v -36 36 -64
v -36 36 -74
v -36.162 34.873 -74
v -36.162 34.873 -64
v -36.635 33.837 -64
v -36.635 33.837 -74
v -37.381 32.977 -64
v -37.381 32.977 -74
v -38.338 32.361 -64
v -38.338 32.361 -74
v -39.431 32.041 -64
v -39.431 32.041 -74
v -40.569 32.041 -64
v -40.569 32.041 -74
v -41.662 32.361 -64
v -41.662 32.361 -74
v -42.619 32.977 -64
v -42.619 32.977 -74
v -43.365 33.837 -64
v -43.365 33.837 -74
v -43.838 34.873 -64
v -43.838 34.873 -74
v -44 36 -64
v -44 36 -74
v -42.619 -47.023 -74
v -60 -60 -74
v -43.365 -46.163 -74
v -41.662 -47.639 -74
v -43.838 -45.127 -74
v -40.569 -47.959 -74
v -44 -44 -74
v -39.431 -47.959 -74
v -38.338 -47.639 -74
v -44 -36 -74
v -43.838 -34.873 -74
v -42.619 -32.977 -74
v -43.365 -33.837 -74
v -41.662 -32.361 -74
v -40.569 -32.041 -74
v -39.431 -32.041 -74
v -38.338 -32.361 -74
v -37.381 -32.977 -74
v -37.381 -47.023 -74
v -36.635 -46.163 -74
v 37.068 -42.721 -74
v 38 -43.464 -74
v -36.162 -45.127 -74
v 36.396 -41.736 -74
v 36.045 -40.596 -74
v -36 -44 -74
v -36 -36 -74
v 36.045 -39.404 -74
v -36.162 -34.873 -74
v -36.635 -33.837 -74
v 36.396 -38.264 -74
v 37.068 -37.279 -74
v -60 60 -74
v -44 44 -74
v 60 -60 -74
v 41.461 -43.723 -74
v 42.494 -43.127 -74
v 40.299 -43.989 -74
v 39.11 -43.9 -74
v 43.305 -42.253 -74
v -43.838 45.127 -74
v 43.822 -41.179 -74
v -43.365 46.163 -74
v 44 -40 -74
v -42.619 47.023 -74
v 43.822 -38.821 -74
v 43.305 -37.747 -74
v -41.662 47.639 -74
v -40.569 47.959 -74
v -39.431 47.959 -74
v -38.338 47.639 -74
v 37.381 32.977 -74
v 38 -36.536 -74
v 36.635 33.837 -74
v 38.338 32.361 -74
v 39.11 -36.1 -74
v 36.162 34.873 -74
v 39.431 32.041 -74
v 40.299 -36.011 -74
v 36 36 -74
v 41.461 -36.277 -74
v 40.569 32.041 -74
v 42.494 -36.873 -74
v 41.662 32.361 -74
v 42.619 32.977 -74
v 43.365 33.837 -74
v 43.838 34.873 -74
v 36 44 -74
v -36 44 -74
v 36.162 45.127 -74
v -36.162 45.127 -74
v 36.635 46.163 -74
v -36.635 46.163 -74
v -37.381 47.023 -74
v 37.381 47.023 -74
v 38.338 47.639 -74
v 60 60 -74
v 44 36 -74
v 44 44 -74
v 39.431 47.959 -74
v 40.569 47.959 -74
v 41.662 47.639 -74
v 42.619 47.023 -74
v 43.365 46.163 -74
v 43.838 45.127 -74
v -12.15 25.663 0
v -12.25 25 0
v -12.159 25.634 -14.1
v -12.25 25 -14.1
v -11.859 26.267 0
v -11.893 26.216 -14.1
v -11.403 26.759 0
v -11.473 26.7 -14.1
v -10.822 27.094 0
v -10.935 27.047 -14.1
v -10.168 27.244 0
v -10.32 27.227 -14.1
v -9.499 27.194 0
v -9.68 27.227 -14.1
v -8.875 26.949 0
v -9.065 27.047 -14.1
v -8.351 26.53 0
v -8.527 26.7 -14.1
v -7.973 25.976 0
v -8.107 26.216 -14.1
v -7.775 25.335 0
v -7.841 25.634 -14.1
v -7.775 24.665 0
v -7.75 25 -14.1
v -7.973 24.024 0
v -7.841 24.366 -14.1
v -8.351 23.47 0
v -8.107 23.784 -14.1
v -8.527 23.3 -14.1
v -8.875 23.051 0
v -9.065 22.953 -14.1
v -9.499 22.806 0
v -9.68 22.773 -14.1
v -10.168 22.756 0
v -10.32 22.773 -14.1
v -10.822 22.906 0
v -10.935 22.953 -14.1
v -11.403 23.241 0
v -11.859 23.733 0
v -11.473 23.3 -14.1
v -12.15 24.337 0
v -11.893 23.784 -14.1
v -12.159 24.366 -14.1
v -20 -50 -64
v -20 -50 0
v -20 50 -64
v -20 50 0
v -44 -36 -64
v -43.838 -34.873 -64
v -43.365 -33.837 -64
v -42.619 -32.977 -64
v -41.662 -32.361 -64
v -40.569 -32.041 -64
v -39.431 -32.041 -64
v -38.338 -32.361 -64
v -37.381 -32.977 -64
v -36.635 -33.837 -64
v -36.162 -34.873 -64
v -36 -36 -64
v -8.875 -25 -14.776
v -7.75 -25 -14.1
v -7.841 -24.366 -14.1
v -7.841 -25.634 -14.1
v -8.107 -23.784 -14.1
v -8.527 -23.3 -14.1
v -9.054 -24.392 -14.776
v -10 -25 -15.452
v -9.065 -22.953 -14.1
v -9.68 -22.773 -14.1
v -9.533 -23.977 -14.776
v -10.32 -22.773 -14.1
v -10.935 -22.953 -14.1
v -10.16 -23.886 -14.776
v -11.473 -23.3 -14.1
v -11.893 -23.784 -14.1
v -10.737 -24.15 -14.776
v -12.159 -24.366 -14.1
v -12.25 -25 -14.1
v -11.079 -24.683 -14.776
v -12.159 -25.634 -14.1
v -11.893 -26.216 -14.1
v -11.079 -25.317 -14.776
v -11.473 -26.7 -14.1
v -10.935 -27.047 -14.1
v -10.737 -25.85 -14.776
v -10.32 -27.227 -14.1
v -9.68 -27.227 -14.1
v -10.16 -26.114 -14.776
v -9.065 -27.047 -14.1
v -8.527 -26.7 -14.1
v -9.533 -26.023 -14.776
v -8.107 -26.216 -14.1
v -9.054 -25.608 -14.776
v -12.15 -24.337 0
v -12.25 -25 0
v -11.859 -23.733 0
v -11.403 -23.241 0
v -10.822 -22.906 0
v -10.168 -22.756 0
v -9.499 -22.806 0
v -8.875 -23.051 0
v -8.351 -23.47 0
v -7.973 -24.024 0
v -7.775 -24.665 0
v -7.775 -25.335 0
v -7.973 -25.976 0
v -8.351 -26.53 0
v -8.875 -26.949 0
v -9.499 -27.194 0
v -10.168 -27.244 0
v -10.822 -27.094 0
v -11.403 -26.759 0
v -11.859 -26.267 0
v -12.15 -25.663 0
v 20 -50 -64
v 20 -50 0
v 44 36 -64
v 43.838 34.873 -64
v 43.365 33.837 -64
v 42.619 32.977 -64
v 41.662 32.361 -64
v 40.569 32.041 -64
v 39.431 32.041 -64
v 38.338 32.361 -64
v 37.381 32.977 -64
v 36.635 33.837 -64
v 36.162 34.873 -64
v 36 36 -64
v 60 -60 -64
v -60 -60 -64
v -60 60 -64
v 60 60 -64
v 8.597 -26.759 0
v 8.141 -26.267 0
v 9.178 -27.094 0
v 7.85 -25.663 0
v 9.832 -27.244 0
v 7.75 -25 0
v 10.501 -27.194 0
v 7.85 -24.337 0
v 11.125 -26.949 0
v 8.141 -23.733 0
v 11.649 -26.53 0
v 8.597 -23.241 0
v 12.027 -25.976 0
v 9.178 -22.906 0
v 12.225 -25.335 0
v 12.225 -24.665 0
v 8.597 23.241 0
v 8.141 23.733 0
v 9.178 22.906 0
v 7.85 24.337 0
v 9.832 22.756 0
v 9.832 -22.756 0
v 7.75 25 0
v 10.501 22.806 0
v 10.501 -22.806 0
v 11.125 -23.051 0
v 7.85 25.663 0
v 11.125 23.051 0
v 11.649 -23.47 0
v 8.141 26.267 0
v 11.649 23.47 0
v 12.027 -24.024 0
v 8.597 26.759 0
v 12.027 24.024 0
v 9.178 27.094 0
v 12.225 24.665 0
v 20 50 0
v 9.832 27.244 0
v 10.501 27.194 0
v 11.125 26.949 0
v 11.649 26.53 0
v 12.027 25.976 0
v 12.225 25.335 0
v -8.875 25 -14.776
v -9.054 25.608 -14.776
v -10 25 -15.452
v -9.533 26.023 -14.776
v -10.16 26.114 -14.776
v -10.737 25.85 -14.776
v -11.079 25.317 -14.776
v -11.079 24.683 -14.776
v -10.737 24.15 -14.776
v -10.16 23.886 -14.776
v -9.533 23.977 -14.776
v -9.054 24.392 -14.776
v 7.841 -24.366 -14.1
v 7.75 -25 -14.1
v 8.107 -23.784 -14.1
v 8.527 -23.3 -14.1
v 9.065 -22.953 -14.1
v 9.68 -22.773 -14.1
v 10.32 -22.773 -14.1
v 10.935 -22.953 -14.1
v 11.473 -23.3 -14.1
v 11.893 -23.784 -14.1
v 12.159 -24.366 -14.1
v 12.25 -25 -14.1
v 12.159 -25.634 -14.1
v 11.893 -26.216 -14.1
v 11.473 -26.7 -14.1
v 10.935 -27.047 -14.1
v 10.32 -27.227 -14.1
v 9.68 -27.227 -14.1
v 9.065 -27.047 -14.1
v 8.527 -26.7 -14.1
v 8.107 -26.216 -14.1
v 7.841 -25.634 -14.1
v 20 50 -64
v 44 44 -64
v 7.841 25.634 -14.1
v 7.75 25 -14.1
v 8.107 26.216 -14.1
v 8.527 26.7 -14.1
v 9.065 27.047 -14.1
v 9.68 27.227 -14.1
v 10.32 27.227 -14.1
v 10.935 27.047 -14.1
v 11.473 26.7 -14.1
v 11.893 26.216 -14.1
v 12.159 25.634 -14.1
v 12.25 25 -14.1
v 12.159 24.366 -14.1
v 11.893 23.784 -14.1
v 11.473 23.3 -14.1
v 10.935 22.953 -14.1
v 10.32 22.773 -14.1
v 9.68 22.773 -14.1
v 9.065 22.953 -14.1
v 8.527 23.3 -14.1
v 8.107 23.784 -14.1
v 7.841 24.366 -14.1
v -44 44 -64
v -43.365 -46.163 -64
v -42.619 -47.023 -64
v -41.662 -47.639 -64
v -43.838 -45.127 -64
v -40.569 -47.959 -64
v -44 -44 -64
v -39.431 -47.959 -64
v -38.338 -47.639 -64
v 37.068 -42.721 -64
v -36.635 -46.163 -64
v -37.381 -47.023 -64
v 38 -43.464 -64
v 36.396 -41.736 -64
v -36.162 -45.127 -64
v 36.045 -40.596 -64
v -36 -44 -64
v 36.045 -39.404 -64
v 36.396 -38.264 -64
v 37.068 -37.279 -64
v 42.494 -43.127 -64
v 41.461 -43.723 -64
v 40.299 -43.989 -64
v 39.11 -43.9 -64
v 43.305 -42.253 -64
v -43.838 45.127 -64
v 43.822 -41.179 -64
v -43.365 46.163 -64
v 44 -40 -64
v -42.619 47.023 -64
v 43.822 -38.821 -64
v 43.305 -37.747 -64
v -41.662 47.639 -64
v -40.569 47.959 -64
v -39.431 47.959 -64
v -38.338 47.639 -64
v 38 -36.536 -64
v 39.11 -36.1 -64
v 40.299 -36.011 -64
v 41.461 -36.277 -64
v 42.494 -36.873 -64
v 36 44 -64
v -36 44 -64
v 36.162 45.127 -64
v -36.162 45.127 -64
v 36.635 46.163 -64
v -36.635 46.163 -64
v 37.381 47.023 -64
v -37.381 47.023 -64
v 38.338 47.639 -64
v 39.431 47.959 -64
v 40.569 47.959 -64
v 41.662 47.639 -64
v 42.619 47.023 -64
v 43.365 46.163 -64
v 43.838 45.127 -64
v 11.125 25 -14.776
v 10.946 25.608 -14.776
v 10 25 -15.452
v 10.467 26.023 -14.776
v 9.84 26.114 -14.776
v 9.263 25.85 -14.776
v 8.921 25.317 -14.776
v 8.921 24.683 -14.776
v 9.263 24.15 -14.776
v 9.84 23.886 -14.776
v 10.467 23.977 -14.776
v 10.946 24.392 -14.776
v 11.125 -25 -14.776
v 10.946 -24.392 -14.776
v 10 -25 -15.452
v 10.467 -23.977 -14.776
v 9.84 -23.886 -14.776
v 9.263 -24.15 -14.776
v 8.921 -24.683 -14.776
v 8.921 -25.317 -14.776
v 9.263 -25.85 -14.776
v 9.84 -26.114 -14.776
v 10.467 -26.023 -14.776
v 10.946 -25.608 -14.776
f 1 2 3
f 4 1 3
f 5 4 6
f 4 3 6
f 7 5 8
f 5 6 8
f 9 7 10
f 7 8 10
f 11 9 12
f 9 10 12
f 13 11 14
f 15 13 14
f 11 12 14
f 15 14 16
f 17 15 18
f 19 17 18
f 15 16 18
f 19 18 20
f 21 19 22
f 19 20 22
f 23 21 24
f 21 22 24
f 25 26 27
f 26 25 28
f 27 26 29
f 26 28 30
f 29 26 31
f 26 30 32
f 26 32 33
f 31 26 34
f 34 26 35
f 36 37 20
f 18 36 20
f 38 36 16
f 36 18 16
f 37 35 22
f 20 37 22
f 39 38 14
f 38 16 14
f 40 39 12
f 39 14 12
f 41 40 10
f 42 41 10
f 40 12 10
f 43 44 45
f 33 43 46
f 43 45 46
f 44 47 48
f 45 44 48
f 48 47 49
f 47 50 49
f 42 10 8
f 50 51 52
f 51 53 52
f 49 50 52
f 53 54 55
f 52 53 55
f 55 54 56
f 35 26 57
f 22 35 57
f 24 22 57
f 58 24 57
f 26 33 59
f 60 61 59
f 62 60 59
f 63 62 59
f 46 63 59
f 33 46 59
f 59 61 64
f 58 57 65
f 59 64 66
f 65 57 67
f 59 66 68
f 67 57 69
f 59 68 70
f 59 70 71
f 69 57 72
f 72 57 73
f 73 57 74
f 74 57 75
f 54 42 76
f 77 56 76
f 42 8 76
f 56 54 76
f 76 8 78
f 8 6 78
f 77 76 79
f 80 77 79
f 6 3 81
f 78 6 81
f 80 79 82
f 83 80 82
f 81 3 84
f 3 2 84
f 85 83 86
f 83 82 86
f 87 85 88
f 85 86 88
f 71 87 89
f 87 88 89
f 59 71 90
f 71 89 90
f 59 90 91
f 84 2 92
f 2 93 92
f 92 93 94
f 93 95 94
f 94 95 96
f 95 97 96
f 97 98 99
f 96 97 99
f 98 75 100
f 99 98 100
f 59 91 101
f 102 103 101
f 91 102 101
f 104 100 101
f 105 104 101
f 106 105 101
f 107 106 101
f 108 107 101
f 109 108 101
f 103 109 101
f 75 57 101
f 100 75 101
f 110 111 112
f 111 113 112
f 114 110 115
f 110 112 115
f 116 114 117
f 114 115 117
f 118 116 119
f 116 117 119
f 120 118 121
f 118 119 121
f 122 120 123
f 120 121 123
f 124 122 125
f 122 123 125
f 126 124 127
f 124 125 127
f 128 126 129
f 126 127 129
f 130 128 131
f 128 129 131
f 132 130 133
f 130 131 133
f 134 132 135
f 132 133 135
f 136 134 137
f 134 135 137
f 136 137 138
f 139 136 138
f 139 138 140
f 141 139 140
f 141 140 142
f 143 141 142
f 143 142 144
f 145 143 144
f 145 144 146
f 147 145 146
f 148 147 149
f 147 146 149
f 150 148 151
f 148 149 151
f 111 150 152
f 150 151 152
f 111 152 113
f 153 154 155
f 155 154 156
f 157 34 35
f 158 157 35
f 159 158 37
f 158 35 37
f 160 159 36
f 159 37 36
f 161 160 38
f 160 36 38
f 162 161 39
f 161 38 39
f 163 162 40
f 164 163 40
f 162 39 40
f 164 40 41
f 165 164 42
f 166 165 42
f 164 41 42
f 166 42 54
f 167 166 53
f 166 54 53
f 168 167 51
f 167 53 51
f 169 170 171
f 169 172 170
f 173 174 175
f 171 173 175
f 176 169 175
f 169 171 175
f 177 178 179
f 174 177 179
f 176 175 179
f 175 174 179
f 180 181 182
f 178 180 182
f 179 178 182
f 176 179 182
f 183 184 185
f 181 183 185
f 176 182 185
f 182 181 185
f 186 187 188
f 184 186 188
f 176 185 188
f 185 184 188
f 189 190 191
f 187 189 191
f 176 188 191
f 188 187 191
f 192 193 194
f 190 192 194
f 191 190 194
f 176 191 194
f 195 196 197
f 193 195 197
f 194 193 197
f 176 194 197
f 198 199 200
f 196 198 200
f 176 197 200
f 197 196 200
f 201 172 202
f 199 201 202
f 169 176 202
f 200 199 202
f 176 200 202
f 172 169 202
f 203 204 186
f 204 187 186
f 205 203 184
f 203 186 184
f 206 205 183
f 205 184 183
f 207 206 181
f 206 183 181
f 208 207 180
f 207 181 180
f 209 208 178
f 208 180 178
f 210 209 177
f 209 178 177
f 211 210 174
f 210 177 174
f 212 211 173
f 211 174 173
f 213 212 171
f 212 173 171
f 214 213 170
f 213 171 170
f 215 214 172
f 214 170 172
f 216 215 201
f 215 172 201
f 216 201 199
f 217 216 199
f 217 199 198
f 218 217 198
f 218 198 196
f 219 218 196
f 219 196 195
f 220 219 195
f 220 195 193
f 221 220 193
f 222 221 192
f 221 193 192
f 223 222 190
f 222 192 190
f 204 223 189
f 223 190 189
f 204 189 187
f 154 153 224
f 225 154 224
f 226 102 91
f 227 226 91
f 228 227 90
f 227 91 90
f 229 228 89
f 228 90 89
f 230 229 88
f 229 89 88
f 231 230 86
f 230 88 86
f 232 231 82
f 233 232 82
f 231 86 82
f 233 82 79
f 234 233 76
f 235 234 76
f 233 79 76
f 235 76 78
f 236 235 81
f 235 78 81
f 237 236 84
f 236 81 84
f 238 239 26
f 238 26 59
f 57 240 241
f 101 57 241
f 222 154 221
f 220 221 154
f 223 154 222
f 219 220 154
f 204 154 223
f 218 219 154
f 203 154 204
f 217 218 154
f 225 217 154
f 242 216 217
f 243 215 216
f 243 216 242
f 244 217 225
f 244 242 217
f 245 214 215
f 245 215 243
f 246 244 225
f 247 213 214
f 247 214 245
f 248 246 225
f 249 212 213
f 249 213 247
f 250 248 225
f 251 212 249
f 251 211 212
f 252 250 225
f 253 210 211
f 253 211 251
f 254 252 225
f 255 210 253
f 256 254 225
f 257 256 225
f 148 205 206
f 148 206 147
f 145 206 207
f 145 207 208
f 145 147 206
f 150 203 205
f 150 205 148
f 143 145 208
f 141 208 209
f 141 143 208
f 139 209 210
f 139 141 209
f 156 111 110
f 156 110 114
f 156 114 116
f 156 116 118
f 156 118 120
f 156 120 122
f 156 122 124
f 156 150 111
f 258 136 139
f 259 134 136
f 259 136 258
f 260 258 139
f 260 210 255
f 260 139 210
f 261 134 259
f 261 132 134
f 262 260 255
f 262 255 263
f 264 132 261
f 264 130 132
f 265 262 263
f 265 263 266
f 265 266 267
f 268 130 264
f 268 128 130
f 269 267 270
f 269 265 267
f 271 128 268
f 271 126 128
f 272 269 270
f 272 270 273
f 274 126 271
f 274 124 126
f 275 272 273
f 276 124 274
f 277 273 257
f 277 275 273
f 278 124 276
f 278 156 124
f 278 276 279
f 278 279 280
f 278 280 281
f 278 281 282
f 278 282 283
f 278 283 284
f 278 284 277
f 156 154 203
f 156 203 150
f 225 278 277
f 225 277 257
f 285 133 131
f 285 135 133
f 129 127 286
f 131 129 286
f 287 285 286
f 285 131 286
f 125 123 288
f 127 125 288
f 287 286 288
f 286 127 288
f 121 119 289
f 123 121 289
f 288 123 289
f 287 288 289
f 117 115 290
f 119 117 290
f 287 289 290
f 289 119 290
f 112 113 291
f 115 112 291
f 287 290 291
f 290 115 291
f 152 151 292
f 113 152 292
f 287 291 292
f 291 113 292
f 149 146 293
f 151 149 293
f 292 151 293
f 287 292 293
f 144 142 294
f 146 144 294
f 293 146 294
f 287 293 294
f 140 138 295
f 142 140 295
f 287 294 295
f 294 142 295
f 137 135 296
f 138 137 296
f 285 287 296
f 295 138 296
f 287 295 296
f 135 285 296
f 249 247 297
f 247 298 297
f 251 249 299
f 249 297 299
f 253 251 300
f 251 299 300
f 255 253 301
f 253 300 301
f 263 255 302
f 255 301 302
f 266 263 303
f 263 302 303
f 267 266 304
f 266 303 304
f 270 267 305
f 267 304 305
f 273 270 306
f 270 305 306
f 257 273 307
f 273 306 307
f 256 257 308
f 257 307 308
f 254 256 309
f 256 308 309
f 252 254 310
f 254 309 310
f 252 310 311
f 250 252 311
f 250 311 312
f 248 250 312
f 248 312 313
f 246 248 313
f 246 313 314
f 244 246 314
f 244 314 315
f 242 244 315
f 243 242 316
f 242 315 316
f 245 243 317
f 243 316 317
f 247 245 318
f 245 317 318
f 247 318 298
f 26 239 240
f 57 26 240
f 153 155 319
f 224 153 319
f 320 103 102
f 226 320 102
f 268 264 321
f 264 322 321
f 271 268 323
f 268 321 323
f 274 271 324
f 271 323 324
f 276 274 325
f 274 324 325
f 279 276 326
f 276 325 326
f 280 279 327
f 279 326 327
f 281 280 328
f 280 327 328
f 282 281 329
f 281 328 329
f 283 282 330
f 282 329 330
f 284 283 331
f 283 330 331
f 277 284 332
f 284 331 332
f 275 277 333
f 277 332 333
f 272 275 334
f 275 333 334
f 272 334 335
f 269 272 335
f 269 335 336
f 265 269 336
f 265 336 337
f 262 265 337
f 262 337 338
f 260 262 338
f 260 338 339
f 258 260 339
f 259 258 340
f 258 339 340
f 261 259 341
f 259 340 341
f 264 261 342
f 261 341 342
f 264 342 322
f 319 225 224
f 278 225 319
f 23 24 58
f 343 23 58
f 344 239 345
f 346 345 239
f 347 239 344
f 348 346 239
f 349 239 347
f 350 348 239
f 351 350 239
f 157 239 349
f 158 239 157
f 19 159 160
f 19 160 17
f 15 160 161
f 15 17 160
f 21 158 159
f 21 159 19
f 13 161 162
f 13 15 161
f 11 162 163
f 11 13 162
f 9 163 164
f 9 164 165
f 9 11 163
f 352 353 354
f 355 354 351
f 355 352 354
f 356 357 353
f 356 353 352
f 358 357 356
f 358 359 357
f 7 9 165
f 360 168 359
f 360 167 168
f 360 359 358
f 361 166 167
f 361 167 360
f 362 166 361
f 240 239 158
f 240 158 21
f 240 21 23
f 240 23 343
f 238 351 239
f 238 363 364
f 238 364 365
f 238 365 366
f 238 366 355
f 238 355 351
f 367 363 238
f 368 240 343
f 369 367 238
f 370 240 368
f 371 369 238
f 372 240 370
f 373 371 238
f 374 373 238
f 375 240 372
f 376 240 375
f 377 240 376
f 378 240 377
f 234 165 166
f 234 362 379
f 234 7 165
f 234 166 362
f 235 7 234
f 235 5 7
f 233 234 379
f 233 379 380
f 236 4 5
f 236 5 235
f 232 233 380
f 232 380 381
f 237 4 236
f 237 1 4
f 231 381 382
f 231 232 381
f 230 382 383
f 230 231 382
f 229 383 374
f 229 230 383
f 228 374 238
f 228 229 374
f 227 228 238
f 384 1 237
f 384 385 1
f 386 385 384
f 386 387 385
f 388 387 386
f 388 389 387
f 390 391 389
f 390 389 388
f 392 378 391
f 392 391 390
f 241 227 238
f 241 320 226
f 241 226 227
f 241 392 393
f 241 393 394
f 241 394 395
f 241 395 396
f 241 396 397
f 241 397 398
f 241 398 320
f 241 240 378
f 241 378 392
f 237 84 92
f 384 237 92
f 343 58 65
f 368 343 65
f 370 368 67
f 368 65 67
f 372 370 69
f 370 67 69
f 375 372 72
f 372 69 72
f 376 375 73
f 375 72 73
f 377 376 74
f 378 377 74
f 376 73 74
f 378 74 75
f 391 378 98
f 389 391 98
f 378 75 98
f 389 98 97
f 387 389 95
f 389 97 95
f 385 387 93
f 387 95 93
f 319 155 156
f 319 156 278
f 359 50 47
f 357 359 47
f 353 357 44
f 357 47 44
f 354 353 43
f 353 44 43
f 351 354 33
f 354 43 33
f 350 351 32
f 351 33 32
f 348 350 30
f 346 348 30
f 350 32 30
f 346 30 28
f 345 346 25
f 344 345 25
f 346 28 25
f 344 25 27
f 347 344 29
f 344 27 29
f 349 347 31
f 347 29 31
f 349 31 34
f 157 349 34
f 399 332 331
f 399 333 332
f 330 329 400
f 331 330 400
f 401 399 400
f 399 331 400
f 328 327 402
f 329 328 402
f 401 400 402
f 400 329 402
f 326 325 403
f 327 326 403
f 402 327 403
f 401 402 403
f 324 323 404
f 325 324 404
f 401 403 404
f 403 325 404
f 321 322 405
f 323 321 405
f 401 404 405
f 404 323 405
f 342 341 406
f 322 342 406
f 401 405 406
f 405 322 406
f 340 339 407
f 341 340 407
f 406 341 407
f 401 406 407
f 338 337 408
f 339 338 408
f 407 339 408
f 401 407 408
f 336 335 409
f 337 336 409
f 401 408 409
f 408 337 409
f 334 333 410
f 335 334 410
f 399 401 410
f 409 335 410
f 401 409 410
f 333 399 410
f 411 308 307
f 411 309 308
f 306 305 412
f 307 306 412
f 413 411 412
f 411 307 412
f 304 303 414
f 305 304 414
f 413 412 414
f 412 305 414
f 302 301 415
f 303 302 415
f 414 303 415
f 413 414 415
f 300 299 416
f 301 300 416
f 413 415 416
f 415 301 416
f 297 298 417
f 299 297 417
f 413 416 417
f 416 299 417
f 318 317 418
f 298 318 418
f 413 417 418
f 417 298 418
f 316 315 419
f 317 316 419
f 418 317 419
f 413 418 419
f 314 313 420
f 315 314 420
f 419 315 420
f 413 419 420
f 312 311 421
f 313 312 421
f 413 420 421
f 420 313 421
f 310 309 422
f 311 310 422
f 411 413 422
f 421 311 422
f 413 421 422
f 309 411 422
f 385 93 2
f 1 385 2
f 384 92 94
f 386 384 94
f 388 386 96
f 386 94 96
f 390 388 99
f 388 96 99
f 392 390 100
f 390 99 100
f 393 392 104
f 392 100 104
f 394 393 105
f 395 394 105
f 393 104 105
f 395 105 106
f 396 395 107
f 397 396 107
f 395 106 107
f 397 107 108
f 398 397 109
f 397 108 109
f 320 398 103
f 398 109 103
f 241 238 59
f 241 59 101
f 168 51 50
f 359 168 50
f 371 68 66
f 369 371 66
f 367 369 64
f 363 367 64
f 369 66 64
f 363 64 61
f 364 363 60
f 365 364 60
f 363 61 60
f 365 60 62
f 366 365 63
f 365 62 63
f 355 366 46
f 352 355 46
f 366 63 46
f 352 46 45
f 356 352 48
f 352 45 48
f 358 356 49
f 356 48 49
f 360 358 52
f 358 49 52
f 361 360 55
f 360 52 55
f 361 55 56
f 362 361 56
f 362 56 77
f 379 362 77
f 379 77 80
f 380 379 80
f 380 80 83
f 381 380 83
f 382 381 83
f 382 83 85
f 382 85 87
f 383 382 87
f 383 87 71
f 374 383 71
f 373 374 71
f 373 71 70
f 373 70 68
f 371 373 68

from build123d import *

# Parameters (mm, degrees)
F0_W     = 40
F0_H     = 100
F1_DEPTH = 64
F2_D     = 4.5
F2_DEPTH = 14.1
F2_TIP   = 1.3519363928
F3_START = -64
F0_W_2   = 120
F0_H_2   = 120
F3_DEPTH = 10
F4_R     = 4
F5_DEPTH = 25


with BuildPart() as f1:
    # F0 (on Top) → F1 (new body)
    with BuildSketch(Plane.XY):
        Rectangle(F0_W, F0_H)
    extrude(amount=-F1_DEPTH)

    # F2
    with Locations(Plane.XY):
        with Locations((-10, 25), (10, 25), (-10, -25), (10, -25)):
            Hole(F2_D / 2, depth=F2_DEPTH)
            with Locations((0, 0, -(F2_DEPTH + F2_TIP / 2))):  # 118° drill point
                Cone(0, F2_D / 2, F2_TIP, mode=Mode.SUBTRACT)


with BuildPart() as f3:
    # F0 (on Top) → F3 (new body)
    with BuildSketch(Plane.XY.offset(F3_START)):
        Rectangle(F0_W_2, F0_H_2)
        Rectangle(F0_W, F0_H, mode=Mode.SUBTRACT)
        Rectangle(F0_W, F0_H)
    extrude(amount=-F3_DEPTH)

    # F4 (on face) → F5 (cut)
    with BuildSketch(Plane(origin=(0, 0, -74), x_dir=(1, 0, 0), z_dir=(0, 0, -1))):
        with BuildLine():
            ThreePointArc((-40, 40), (-37.1715728753, 41.1715728753), (-36, 44))
            ThreePointArc((-36, 44), (-40, 48), (-44, 44))
            ThreePointArc((-44, 44), (-42.8284271247, 41.1715728753), (-40, 40))
        make_face()
        with BuildLine():
            ThreePointArc((-36, 36), (-37.1715728753, 38.8284271247), (-40, 40))
            ThreePointArc((-40, 40), (-42.8284271247, 38.8284271247), (-44, 36))
            ThreePointArc((-44, 36), (-40, 32), (-36, 36))
        make_face()
        with BuildLine():
            Line((-36, 36), (-36, 44))
            ThreePointArc((-36, 44), (-37.1715728753, 41.1715728753), (-40, 40))
            ThreePointArc((-40, 40), (-37.1715728753, 38.8284271247), (-36, 36))
        make_face()
        with BuildLine():
            ThreePointArc((-40, 40), (-42.8284271247, 41.1715728753), (-44, 44))
            Line((-44, 44), (-44, 36))
            ThreePointArc((-44, 36), (-42.8284271247, 38.8284271247), (-40, 40))
        make_face()
        with Locations((40, 40)):
            Circle(F4_R)
        with BuildLine():
            ThreePointArc((-40, -40), (-37.1715728753, -38.8284271247), (-36, -36))
            ThreePointArc((-36, -36), (-40, -32), (-44, -36))
            ThreePointArc((-44, -36), (-42.8284271247, -38.8284271247), (-40, -40))
        make_face()
        with BuildLine():
            ThreePointArc((-36, -44), (-37.1715728753, -41.1715728753), (-40, -40))
            ThreePointArc((-40, -40), (-42.8284271247, -41.1715728753), (-44, -44))
            ThreePointArc((-44, -44), (-40, -48), (-36, -44))
        make_face()
        with BuildLine():
            ThreePointArc((-40, -40), (-42.8284271247, -38.8284271247), (-44, -36))
            Line((-44, -36), (-44, -44))
            ThreePointArc((-44, -44), (-42.8284271247, -41.1715728753), (-40, -40))
        make_face()
        with BuildLine():
            Line((-36, -44), (-36, -36))
            ThreePointArc((-36, -36), (-37.1715728753, -38.8284271247), (-40, -40))
            ThreePointArc((-40, -40), (-37.1715728753, -41.1715728753), (-36, -44))
        make_face()
        with BuildLine():
            ThreePointArc((44, -44), (42.8284271247, -41.1715728753), (40, -40))
            ThreePointArc((40, -40), (37.1715728753, -41.1715728753), (36, -44))
            ThreePointArc((36, -44), (40, -48), (44, -44))
        make_face()
        with BuildLine():
            ThreePointArc((40, -40), (42.8284271247, -38.8284271247), (44, -36))
            ThreePointArc((44, -36), (40, -32), (36, -36))
            ThreePointArc((36, -36), (37.1715728753, -38.8284271247), (40, -40))
        make_face()
        with BuildLine():
            ThreePointArc((40, -40), (37.1715728753, -38.8284271247), (36, -36))
            Line((36, -36), (36, -44))
            ThreePointArc((36, -44), (37.1715728753, -41.1715728753), (40, -40))
        make_face()
        with BuildLine():
            Line((44, -44), (44, -36))
            ThreePointArc((44, -36), (42.8284271247, -38.8284271247), (40, -40))
            ThreePointArc((40, -40), (42.8284271247, -41.1715728753), (44, -44))
        make_face()
    extrude(amount=-F5_DEPTH, mode=Mode.SUBTRACT)


solid = Compound([f1.part, f3.part])
